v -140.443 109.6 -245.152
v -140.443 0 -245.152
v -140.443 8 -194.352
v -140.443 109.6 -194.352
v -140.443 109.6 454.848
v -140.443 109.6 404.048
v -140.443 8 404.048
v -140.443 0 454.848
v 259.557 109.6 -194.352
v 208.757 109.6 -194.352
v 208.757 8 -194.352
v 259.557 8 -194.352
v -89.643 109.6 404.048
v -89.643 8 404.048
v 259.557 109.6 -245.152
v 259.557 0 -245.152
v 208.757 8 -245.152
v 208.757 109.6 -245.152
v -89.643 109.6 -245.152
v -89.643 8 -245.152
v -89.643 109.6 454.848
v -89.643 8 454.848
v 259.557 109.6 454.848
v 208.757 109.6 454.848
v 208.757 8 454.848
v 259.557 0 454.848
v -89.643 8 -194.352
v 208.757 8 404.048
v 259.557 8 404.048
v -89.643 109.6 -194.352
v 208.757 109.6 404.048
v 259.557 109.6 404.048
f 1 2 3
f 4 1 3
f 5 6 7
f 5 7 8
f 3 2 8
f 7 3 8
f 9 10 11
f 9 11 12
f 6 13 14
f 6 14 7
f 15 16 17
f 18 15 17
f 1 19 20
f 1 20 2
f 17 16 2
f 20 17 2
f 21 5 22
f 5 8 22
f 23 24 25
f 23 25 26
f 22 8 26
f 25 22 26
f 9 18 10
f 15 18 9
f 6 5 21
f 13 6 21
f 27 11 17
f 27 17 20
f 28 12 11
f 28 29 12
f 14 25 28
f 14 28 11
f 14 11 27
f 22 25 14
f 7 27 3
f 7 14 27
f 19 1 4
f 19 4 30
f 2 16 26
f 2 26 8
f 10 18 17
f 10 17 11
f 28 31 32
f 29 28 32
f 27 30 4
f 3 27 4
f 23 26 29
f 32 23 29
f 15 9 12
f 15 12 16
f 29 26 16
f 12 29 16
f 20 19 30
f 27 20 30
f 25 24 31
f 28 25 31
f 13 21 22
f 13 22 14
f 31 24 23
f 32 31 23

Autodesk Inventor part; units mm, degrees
ref_plane "YZ Plane" through (0, 0, 0) normal (1, 0, 0) x (0, 1, 0)
ref_plane "XZ Plane" through (0, 0, 0) normal (0, 1, 0) x (-1, 0, 0)
ref_plane "XY Plane" through (0, 0, 0) normal (0, 0, 1) x (1, 0, 0)
sketch "Sketch1" plane through (0, 0, 0) normal (0, 1, 0) x (-1, 0, 0)
  line L0 (140.4432, 454.8476) -> (-259.5568, 454.8476)
  line L1 (-259.5568, 454.8476) -> (-259.5568, -245.1524)
  line L2 (-259.5568, -245.1524) -> (140.4432, -245.1524)
  line L3 (140.4432, -245.1524) -> (140.4432, 454.8476)
  point P0 (0, 0)
  dimension "d0" = 700
  dimension "d1" = 400
extrude "Extrusion1" add sketch "Sketch1" along normal blind 8
sketch "Sketch2" plane through (0, 8, 0) normal (0, 1, 0) x (1, 0, 0)
  line L0 (-140.4432, 245.1524) -> (-140.4432, -454.8476) projected
  line L1 (-140.4432, -454.8476) -> (-89.6432, -454.8476)
  line L2 (-89.6432, -454.8476) -> (-89.6432, -404.0476)
  line L3 (-89.6432, -404.0476) -> (-140.4432, -404.0476)
  line L4 (-140.4432, -404.0476) -> (-140.4432, -454.8476)
  line L5 (259.5568, -454.8476) -> (259.5568, 245.1524) projected
  line L6 (259.5568, -454.8476) -> (208.7568, -454.8476)
  line L7 (208.7568, -454.8476) -> (208.7568, -404.0476)
  line L8 (208.7568, -404.0476) -> (259.5568, -404.0476)
  line L9 (259.5568, -404.0476) -> (259.5568, -454.8476)
  line L10 (259.5568, 245.1524) -> (208.7568, 245.1524)
  line L11 (208.7568, 245.1524) -> (208.7568, 194.3524)
  line L12 (208.7568, 194.3524) -> (259.5568, 194.3524)
  line L13 (259.5568, 194.3524) -> (259.5568, 245.1524)
  line L14 (-140.4432, 245.1524) -> (-89.6432, 245.1524)
  line L15 (-89.6432, 245.1524) -> (-89.6432, 194.3524)
  line L16 (-89.6432, 194.3524) -> (-140.4432, 194.3524)
  line L17 (-140.4432, 194.3524) -> (-140.4432, 245.1524)
  point P0 (0, 0)
  point P1 (259.5568, -404.0476)
  dimension "d4" = 50.8
  dimension "d5" = 50.8
  dimension "d6" = 50.8
  dimension "d7" = 50.8
  dimension "d8" = 50.8
  dimension "d9" = 50.8
  dimension "d10" = 50.8
extrude "Extrusion2" add sketch "Sketch2" along normal blind 101.6
properties part number "board" material "Wood (Birch)"
